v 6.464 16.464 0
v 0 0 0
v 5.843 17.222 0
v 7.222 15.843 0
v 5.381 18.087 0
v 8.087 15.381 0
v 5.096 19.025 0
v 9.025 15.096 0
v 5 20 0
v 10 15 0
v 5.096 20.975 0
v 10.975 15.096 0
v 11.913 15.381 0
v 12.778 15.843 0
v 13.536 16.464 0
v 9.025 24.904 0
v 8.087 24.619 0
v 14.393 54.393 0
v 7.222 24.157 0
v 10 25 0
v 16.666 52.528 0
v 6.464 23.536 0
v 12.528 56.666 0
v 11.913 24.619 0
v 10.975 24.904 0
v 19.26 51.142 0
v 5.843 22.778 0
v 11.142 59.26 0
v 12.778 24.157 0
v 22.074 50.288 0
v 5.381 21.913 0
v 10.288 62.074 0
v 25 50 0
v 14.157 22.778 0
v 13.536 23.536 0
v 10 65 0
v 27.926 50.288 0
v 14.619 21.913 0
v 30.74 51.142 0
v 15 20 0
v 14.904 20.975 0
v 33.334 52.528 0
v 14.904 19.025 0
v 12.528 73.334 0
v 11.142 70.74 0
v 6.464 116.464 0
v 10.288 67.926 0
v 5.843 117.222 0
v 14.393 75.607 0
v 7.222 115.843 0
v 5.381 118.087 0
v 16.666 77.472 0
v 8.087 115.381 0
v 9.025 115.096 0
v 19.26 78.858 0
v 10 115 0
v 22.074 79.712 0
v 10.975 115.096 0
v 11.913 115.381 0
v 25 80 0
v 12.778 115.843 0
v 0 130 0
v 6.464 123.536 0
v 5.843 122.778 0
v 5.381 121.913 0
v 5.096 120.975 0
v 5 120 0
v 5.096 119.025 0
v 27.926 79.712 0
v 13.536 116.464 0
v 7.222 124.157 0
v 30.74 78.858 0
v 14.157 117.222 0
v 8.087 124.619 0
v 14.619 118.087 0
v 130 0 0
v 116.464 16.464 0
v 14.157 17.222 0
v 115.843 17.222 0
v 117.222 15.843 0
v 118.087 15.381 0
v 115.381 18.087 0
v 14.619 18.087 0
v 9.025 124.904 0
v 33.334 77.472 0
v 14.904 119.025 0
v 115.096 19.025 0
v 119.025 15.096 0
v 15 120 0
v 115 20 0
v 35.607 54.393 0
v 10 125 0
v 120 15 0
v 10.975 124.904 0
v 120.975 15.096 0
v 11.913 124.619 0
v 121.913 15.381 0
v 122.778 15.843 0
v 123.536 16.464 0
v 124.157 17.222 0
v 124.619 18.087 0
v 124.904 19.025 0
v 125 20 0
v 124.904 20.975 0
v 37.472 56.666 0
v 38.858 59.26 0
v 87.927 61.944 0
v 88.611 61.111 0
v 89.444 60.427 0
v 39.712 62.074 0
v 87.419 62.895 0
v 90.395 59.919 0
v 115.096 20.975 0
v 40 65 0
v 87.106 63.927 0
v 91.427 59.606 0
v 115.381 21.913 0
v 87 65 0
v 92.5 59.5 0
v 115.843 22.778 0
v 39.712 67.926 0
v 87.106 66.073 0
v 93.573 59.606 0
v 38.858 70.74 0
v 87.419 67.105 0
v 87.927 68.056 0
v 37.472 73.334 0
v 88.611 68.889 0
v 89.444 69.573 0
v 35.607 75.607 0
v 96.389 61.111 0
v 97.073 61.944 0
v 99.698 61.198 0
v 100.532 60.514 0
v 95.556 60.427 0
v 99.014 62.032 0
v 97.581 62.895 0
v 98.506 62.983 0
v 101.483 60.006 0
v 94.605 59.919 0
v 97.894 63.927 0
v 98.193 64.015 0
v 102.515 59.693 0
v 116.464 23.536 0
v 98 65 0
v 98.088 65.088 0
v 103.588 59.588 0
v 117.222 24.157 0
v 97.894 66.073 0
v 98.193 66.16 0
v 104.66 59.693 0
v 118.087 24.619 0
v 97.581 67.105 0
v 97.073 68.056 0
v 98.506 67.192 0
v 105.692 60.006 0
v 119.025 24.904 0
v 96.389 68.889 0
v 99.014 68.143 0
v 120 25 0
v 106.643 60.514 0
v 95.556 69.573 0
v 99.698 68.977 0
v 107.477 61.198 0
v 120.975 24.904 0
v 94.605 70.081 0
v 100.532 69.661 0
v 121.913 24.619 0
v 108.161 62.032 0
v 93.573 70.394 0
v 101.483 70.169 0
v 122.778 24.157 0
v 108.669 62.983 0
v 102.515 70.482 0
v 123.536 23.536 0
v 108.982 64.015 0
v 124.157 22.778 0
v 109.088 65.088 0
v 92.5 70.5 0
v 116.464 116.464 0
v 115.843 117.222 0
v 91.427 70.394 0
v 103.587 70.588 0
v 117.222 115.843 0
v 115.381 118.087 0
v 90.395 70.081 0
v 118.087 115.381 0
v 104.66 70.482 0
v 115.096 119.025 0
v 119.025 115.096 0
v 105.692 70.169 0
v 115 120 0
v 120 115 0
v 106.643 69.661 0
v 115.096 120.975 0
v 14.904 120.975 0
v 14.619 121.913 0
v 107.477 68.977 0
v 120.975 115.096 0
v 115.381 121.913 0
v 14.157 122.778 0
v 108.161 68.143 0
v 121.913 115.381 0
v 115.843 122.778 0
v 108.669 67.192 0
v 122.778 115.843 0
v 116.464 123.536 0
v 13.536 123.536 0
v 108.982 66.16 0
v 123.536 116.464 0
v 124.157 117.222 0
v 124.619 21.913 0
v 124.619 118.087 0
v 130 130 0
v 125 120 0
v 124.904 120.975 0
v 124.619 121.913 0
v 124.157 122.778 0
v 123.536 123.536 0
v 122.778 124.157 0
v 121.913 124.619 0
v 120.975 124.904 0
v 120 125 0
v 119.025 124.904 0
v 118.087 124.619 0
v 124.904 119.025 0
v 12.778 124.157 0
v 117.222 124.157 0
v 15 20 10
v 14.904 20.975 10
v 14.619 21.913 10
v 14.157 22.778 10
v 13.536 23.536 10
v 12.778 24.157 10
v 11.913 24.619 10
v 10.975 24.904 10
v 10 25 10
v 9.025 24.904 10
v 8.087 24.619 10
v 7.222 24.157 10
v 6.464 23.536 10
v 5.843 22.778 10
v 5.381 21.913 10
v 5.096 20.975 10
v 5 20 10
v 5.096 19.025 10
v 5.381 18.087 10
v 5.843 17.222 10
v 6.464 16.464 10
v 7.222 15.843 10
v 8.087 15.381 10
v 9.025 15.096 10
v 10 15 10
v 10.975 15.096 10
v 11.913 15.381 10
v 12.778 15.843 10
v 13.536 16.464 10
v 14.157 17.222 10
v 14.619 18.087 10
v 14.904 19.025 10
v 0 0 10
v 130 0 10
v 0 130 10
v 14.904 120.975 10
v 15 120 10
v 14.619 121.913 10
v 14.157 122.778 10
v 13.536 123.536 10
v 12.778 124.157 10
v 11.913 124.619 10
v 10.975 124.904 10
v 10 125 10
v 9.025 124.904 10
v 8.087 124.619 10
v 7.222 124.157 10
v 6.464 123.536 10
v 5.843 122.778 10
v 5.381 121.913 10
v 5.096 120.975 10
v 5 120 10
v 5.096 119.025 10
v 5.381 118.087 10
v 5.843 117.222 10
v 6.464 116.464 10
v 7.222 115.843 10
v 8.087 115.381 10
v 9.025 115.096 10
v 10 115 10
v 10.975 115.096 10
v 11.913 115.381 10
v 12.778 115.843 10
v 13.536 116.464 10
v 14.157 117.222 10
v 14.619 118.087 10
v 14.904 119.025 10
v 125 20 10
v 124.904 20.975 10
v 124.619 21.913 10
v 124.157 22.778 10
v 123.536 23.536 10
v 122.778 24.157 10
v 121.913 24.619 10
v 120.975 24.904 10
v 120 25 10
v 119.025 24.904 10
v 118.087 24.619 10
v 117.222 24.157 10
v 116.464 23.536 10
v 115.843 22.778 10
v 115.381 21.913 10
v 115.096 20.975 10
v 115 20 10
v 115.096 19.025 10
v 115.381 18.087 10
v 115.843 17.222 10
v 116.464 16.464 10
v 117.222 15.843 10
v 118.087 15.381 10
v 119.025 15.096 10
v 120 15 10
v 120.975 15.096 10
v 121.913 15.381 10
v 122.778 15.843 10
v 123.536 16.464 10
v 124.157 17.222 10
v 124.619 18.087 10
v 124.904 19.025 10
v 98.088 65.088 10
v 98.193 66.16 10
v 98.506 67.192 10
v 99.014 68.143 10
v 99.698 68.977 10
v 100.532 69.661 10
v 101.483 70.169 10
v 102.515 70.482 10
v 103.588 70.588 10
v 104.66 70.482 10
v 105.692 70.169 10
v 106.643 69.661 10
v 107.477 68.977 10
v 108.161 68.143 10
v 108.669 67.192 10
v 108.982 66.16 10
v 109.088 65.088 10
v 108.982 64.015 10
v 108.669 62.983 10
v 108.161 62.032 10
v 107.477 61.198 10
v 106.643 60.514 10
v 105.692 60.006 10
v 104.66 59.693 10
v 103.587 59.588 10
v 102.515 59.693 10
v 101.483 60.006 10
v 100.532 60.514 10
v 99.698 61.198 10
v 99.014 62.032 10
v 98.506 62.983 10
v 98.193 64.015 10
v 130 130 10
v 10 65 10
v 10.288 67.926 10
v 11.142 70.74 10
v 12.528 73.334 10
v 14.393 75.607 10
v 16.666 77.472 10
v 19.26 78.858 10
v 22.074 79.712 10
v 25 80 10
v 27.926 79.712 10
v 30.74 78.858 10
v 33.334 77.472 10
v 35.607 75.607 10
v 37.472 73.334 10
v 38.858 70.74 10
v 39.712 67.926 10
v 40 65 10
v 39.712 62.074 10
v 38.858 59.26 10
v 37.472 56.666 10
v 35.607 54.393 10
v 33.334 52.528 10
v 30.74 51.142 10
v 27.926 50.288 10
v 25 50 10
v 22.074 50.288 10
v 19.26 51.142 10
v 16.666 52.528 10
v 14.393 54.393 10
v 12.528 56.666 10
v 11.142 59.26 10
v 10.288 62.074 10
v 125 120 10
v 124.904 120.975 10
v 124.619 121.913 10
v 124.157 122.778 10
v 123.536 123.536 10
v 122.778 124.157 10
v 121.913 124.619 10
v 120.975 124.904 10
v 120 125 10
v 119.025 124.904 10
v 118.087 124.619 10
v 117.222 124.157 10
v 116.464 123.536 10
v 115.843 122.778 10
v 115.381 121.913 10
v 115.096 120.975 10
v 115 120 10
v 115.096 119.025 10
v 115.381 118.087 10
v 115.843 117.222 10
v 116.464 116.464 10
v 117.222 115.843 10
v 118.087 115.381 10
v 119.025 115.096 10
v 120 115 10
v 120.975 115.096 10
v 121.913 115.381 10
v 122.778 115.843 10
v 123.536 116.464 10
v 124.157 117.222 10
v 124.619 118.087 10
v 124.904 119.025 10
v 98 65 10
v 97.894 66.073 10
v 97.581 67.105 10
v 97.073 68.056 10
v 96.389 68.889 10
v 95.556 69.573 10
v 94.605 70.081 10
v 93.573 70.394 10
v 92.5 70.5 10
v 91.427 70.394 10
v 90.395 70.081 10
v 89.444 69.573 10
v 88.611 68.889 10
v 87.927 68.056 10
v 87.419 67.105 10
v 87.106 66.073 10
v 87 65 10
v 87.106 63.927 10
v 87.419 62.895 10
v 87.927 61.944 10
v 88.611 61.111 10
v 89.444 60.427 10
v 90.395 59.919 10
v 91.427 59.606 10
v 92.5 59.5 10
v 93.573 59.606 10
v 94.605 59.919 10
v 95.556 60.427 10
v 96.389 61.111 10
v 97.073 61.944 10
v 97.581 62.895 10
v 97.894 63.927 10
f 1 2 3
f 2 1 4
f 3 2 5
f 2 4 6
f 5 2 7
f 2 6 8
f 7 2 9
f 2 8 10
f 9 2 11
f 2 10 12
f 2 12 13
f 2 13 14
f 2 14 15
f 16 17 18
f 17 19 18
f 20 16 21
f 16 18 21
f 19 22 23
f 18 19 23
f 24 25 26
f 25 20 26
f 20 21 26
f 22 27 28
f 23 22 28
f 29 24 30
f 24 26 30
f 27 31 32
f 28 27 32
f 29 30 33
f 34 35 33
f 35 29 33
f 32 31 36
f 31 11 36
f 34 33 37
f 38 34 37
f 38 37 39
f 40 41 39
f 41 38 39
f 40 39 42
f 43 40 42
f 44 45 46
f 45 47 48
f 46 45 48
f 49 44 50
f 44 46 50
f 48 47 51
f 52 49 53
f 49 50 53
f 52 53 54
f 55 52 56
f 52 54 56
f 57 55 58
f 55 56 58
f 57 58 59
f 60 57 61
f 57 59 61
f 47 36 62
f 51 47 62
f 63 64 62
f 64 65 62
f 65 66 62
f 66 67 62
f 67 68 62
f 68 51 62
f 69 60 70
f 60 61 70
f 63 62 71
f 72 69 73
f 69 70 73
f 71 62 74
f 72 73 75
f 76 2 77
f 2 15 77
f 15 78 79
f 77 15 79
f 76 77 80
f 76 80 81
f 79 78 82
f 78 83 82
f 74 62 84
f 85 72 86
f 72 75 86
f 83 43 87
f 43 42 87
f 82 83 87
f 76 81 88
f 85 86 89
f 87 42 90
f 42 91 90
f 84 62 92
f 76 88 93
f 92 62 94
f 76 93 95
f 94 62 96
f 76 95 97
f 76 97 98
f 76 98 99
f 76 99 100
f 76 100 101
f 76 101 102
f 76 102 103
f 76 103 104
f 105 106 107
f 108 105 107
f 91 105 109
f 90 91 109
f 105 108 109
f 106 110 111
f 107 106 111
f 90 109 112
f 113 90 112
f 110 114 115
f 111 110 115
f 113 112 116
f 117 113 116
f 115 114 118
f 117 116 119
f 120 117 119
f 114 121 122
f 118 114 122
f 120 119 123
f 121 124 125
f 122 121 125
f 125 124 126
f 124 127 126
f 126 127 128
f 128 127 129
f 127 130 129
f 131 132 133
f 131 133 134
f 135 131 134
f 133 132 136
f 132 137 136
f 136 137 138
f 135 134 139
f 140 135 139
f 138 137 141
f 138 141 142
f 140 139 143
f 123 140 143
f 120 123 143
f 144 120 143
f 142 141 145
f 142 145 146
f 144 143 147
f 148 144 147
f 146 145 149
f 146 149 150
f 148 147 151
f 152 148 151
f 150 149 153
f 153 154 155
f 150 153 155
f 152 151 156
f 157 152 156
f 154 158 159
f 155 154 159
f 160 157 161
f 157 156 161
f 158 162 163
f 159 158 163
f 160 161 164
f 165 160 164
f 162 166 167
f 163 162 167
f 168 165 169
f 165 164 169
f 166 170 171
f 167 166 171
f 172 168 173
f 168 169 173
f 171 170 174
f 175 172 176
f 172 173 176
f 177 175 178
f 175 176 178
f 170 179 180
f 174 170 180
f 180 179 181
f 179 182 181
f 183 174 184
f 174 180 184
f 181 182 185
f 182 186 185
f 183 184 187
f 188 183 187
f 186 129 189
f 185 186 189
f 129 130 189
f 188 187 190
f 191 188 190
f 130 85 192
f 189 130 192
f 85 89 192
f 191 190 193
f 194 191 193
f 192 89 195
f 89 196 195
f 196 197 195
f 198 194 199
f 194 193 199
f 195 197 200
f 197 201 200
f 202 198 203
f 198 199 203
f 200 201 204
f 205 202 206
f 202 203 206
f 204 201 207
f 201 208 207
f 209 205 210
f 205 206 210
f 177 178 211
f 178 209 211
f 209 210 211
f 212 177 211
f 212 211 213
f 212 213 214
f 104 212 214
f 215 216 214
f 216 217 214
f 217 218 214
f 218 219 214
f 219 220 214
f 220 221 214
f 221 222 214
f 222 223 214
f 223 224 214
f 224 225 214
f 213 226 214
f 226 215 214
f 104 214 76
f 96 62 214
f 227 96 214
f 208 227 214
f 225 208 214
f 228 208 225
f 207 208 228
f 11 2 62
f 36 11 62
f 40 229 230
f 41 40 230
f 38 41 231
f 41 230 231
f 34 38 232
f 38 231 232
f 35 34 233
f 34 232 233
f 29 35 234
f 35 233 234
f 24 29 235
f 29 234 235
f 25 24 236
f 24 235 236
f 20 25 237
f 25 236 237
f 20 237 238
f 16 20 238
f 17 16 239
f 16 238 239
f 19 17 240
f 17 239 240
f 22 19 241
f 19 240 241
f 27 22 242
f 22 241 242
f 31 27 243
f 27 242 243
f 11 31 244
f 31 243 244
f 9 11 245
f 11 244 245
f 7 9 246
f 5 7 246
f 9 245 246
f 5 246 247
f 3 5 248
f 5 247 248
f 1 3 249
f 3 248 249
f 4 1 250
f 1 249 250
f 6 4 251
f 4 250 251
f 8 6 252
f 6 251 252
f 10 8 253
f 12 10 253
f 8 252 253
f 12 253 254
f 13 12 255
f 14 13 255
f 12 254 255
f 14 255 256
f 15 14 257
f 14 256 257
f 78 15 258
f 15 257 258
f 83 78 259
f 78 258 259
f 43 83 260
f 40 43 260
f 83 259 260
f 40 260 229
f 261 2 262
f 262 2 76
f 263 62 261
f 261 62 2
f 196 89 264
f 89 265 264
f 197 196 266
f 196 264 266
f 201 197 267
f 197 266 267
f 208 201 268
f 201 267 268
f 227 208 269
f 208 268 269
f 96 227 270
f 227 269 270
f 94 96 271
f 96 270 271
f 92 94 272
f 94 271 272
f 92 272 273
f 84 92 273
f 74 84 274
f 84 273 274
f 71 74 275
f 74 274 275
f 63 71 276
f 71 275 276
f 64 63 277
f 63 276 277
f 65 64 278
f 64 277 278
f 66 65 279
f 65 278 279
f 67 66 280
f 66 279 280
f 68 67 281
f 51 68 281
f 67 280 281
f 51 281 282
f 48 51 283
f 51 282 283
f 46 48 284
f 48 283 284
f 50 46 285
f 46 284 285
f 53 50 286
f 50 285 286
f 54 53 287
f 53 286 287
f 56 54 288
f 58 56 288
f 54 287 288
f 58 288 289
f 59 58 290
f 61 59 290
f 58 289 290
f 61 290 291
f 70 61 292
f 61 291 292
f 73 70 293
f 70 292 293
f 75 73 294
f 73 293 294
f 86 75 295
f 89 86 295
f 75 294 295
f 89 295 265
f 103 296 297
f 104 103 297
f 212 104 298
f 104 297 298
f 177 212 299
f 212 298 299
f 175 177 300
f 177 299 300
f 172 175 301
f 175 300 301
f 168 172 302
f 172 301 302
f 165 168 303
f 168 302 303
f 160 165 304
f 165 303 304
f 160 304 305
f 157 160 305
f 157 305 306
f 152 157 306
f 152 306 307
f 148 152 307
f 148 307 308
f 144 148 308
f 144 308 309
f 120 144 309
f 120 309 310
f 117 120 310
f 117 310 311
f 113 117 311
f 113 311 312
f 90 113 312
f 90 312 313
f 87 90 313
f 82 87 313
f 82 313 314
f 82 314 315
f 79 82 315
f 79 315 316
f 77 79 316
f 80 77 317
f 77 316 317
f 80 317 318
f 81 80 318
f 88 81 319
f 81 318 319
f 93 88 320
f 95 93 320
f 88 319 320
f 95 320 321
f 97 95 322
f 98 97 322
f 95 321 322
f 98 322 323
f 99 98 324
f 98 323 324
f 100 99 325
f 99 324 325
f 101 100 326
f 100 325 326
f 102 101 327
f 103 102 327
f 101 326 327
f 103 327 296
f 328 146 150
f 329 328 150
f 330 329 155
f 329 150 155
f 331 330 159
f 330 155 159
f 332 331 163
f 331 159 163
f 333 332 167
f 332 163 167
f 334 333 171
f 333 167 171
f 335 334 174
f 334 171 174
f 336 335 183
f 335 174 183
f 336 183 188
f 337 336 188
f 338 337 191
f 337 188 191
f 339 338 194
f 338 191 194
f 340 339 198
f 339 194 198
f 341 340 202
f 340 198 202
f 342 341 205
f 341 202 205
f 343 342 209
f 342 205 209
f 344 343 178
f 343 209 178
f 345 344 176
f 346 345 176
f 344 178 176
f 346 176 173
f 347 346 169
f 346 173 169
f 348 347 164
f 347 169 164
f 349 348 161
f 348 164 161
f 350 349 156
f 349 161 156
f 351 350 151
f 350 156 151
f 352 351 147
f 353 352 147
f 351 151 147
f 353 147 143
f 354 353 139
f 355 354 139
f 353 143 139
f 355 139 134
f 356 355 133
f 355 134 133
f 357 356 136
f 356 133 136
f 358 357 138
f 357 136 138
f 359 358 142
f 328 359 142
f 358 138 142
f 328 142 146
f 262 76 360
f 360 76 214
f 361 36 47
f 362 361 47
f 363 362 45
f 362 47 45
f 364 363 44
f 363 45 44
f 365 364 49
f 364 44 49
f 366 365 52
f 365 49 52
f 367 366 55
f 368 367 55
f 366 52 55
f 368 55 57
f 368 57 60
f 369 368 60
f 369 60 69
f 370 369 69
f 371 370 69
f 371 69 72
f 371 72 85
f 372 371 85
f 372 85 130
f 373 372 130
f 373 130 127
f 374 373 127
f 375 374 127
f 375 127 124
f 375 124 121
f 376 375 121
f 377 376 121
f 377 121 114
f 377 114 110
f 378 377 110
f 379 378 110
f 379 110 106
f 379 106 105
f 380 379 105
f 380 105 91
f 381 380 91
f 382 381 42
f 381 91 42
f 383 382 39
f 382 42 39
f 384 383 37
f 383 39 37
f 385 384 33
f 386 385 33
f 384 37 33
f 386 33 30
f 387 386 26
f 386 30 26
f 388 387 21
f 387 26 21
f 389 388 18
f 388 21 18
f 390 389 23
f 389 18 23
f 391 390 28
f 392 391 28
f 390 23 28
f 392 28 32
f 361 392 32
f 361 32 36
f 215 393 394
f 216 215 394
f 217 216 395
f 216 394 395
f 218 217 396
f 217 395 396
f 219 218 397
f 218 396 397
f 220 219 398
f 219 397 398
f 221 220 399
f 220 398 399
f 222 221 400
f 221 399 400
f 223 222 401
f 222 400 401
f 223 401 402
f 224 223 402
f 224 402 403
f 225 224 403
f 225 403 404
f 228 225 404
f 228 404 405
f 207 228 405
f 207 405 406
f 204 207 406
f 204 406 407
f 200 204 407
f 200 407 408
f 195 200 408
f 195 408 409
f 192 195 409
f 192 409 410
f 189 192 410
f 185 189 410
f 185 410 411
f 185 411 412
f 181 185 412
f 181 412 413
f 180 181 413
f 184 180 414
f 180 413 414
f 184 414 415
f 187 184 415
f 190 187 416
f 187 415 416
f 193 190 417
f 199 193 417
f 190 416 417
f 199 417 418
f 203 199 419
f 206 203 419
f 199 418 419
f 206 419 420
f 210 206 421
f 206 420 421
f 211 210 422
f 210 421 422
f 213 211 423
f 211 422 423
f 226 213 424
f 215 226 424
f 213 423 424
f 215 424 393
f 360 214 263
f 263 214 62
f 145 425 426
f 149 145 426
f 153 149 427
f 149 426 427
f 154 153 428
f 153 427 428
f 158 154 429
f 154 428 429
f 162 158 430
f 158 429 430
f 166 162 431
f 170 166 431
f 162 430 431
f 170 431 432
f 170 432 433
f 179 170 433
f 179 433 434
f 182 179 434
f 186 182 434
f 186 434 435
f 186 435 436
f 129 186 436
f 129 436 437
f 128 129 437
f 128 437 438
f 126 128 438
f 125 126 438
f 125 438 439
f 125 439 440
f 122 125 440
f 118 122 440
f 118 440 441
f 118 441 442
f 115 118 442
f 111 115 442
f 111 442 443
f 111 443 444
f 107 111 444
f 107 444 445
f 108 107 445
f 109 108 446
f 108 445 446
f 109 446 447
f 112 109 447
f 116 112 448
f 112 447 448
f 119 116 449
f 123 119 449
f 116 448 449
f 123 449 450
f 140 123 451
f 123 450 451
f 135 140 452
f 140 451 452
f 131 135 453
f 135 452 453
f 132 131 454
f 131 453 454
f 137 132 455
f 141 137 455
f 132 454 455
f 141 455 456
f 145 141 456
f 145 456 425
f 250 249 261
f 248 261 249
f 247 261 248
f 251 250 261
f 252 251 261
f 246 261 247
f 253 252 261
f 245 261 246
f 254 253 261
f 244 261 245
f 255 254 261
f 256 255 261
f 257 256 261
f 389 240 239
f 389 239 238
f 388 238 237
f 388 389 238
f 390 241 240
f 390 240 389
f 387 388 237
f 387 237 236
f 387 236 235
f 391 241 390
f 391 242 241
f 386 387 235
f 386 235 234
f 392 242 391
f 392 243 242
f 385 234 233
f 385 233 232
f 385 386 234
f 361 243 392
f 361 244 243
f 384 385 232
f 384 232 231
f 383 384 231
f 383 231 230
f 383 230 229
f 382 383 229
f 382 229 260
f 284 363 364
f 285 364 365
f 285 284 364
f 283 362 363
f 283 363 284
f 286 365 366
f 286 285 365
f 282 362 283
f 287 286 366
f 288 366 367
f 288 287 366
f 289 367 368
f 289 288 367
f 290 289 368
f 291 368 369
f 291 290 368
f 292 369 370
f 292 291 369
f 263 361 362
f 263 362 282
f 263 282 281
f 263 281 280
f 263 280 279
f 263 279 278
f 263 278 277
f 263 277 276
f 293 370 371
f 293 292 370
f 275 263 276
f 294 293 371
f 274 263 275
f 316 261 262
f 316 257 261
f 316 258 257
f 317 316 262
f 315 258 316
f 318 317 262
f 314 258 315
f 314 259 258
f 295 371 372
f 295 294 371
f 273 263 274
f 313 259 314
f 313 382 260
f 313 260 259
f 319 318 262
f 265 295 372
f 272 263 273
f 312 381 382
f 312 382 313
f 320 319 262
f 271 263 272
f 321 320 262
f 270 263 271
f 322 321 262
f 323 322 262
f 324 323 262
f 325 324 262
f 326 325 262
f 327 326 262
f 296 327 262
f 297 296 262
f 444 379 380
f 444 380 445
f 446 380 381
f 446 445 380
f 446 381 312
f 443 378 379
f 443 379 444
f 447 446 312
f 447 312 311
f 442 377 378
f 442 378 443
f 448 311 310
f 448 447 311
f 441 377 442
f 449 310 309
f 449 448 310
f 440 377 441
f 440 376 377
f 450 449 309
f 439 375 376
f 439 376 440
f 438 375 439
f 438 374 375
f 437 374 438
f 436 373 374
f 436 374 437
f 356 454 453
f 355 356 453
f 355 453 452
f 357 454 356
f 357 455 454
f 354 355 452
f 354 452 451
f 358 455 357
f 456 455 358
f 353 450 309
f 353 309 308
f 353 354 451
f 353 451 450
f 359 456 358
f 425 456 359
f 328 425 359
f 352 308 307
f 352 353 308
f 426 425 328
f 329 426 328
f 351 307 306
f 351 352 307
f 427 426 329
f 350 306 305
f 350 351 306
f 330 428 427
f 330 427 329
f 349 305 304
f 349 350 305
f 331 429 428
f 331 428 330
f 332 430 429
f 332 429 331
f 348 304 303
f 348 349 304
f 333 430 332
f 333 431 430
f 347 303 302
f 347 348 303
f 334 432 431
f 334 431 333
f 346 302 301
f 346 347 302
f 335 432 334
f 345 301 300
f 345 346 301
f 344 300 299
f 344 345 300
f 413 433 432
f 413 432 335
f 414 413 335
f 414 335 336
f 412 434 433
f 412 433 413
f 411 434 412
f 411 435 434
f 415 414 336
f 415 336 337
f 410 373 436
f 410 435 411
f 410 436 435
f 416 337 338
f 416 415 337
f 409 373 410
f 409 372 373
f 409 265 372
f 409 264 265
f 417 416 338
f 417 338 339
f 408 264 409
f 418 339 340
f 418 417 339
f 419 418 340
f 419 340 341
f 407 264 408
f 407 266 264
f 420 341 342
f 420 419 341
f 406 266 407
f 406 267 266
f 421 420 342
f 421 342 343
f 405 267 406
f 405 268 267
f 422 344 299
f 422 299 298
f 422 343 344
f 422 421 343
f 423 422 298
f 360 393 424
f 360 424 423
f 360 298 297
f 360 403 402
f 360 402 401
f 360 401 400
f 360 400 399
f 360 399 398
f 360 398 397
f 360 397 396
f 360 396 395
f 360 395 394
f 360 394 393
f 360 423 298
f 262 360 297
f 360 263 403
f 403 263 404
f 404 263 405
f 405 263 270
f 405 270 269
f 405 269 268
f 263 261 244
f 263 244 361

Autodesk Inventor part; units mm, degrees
ref_plane "YZ Plane" through (0, 0, 0) normal (1, 0, 0) x (0, 1, 0)
ref_plane "XZ Plane" through (0, 0, 0) normal (0, 1, 0) x (-1, 0, 0)
ref_plane "XY Plane" through (0, 0, 0) normal (0, 0, 1) x (1, 0, 0)
sketch "Sketch1" plane through (0, 0, 0) normal (0, 0, 1) x (1, 0, 0)
  line L0 (0, 0) -> (130, 0)
  line L1 (130, 0) -> (130, 130)
  line L2 (130, 130) -> (0, 130)
  line L3 (0, 130) -> (0, 0)
  dimension "d0" = 130
  dimension "d1" = 130
extrude "Extrusion1" add sketch "Sketch1" along normal blind 10
sketch "Sketch2" plane through (0, 0, 10) normal (0, 0, 1) x (1, 0, 0)
  line L0 (130, 130) -> (0, 130) projected
  line L1 (0, 130) -> (10, 130)
  line L2 (10, 130) -> (10, 20)
  line L3 (0, 0) -> (130, 0) projected
  line L4 (10, 20) -> (120, 20)
  line L5 (120, 20) -> (120, 130)
  line L6 (120, 130) -> (120, 10)
  line L7 (120, 10) -> (10, 10)
  line L8 (10, 10) -> (10, 120)
  arc A0 (10, 130) -> (10, 123.825) centre (10, 126.9125) ccw
  line L9 (120, 130) -> (120, 120)
  circle A1 centre (120, 120) radius 5
  circle A2 centre (10, 120) radius 5
  circle A3 centre (10, 20) radius 5
  circle A4 centre (120, 20) radius 5
  dimension "d4" = 10
  dimension "d5" = 110
  dimension "d6" = 110
  dimension "d7" = 110
  dimension "d8" = 120
  dimension "d9" = 110
  dimension "d10" = 110
  dimension "d11" = 10
  dimension "d12" = 10
  dimension "d13" = 10
  dimension "d14" = 10
  dimension "d15" = 10
extrude "Extrusion2" cut sketch "Sketch2" against normal blind 10 contours A1 L5 | L5 A1 | A2 L2 | L2 A0 A2 | A0 L2 A2 | A4 L6 L5 | L5 L4 A4 | A3 L4 L2 | L2 L8 A3 | L6 A4 L4 | L4 A3 L8 picked at (9.758, 124.2455) picked at (8.4412, 122.3255)
sketch "Sketch3" plane through (0, 0, 10) normal (0, 0, 1) x (1, 0, 0)
  line L0 (130, 0) -> (130, 130) projected
  line L1 (130, 0) -> (130, 65)
  line L2 (130, 65) -> (92.5, 65)
  circle A0 centre (92.5, 65) radius 5.5
  point P0 (0, 0)
  dimension "d18" = 65
  dimension "d19" = 37.5
  dimension "d20" = 11
extrude "Extrusion3" cut sketch "Sketch3" against normal through all
sketch "Sketch4" plane through (0, 0, 0) normal (0, 0, -1) x (-1, 0, 0)
  line L0 (0, 130) -> (0, 0) projected
  line L1 (0, 130) -> (0, 65)
  line L2 (0, 65) -> (-25, 65)
  circle A0 centre (-25, 65) radius 15
  dimension "d23" = 65
  dimension "d24" = 25
  dimension "d25" = 30
extrude "Extrusion4" cut sketch "Sketch4" against normal blind 10
sketch "Sketch5" plane through (0, 0, 0) normal (0, 0, -1) x (-1, 0, 0)
  line L0 (-128.5875, 65.0875) -> (-103.5875, 65.0875)
  circle A0 centre (-103.5875, 65.0875) radius 5.5
  point P0 (0, 0)
  dimension "d28" = 25
  dimension "d29" = 11
extrude "Extrusion5" cut sketch "Sketch5" against normal blind 11
equation "\"d30\" = d29"
properties part number "PARTIMP"
